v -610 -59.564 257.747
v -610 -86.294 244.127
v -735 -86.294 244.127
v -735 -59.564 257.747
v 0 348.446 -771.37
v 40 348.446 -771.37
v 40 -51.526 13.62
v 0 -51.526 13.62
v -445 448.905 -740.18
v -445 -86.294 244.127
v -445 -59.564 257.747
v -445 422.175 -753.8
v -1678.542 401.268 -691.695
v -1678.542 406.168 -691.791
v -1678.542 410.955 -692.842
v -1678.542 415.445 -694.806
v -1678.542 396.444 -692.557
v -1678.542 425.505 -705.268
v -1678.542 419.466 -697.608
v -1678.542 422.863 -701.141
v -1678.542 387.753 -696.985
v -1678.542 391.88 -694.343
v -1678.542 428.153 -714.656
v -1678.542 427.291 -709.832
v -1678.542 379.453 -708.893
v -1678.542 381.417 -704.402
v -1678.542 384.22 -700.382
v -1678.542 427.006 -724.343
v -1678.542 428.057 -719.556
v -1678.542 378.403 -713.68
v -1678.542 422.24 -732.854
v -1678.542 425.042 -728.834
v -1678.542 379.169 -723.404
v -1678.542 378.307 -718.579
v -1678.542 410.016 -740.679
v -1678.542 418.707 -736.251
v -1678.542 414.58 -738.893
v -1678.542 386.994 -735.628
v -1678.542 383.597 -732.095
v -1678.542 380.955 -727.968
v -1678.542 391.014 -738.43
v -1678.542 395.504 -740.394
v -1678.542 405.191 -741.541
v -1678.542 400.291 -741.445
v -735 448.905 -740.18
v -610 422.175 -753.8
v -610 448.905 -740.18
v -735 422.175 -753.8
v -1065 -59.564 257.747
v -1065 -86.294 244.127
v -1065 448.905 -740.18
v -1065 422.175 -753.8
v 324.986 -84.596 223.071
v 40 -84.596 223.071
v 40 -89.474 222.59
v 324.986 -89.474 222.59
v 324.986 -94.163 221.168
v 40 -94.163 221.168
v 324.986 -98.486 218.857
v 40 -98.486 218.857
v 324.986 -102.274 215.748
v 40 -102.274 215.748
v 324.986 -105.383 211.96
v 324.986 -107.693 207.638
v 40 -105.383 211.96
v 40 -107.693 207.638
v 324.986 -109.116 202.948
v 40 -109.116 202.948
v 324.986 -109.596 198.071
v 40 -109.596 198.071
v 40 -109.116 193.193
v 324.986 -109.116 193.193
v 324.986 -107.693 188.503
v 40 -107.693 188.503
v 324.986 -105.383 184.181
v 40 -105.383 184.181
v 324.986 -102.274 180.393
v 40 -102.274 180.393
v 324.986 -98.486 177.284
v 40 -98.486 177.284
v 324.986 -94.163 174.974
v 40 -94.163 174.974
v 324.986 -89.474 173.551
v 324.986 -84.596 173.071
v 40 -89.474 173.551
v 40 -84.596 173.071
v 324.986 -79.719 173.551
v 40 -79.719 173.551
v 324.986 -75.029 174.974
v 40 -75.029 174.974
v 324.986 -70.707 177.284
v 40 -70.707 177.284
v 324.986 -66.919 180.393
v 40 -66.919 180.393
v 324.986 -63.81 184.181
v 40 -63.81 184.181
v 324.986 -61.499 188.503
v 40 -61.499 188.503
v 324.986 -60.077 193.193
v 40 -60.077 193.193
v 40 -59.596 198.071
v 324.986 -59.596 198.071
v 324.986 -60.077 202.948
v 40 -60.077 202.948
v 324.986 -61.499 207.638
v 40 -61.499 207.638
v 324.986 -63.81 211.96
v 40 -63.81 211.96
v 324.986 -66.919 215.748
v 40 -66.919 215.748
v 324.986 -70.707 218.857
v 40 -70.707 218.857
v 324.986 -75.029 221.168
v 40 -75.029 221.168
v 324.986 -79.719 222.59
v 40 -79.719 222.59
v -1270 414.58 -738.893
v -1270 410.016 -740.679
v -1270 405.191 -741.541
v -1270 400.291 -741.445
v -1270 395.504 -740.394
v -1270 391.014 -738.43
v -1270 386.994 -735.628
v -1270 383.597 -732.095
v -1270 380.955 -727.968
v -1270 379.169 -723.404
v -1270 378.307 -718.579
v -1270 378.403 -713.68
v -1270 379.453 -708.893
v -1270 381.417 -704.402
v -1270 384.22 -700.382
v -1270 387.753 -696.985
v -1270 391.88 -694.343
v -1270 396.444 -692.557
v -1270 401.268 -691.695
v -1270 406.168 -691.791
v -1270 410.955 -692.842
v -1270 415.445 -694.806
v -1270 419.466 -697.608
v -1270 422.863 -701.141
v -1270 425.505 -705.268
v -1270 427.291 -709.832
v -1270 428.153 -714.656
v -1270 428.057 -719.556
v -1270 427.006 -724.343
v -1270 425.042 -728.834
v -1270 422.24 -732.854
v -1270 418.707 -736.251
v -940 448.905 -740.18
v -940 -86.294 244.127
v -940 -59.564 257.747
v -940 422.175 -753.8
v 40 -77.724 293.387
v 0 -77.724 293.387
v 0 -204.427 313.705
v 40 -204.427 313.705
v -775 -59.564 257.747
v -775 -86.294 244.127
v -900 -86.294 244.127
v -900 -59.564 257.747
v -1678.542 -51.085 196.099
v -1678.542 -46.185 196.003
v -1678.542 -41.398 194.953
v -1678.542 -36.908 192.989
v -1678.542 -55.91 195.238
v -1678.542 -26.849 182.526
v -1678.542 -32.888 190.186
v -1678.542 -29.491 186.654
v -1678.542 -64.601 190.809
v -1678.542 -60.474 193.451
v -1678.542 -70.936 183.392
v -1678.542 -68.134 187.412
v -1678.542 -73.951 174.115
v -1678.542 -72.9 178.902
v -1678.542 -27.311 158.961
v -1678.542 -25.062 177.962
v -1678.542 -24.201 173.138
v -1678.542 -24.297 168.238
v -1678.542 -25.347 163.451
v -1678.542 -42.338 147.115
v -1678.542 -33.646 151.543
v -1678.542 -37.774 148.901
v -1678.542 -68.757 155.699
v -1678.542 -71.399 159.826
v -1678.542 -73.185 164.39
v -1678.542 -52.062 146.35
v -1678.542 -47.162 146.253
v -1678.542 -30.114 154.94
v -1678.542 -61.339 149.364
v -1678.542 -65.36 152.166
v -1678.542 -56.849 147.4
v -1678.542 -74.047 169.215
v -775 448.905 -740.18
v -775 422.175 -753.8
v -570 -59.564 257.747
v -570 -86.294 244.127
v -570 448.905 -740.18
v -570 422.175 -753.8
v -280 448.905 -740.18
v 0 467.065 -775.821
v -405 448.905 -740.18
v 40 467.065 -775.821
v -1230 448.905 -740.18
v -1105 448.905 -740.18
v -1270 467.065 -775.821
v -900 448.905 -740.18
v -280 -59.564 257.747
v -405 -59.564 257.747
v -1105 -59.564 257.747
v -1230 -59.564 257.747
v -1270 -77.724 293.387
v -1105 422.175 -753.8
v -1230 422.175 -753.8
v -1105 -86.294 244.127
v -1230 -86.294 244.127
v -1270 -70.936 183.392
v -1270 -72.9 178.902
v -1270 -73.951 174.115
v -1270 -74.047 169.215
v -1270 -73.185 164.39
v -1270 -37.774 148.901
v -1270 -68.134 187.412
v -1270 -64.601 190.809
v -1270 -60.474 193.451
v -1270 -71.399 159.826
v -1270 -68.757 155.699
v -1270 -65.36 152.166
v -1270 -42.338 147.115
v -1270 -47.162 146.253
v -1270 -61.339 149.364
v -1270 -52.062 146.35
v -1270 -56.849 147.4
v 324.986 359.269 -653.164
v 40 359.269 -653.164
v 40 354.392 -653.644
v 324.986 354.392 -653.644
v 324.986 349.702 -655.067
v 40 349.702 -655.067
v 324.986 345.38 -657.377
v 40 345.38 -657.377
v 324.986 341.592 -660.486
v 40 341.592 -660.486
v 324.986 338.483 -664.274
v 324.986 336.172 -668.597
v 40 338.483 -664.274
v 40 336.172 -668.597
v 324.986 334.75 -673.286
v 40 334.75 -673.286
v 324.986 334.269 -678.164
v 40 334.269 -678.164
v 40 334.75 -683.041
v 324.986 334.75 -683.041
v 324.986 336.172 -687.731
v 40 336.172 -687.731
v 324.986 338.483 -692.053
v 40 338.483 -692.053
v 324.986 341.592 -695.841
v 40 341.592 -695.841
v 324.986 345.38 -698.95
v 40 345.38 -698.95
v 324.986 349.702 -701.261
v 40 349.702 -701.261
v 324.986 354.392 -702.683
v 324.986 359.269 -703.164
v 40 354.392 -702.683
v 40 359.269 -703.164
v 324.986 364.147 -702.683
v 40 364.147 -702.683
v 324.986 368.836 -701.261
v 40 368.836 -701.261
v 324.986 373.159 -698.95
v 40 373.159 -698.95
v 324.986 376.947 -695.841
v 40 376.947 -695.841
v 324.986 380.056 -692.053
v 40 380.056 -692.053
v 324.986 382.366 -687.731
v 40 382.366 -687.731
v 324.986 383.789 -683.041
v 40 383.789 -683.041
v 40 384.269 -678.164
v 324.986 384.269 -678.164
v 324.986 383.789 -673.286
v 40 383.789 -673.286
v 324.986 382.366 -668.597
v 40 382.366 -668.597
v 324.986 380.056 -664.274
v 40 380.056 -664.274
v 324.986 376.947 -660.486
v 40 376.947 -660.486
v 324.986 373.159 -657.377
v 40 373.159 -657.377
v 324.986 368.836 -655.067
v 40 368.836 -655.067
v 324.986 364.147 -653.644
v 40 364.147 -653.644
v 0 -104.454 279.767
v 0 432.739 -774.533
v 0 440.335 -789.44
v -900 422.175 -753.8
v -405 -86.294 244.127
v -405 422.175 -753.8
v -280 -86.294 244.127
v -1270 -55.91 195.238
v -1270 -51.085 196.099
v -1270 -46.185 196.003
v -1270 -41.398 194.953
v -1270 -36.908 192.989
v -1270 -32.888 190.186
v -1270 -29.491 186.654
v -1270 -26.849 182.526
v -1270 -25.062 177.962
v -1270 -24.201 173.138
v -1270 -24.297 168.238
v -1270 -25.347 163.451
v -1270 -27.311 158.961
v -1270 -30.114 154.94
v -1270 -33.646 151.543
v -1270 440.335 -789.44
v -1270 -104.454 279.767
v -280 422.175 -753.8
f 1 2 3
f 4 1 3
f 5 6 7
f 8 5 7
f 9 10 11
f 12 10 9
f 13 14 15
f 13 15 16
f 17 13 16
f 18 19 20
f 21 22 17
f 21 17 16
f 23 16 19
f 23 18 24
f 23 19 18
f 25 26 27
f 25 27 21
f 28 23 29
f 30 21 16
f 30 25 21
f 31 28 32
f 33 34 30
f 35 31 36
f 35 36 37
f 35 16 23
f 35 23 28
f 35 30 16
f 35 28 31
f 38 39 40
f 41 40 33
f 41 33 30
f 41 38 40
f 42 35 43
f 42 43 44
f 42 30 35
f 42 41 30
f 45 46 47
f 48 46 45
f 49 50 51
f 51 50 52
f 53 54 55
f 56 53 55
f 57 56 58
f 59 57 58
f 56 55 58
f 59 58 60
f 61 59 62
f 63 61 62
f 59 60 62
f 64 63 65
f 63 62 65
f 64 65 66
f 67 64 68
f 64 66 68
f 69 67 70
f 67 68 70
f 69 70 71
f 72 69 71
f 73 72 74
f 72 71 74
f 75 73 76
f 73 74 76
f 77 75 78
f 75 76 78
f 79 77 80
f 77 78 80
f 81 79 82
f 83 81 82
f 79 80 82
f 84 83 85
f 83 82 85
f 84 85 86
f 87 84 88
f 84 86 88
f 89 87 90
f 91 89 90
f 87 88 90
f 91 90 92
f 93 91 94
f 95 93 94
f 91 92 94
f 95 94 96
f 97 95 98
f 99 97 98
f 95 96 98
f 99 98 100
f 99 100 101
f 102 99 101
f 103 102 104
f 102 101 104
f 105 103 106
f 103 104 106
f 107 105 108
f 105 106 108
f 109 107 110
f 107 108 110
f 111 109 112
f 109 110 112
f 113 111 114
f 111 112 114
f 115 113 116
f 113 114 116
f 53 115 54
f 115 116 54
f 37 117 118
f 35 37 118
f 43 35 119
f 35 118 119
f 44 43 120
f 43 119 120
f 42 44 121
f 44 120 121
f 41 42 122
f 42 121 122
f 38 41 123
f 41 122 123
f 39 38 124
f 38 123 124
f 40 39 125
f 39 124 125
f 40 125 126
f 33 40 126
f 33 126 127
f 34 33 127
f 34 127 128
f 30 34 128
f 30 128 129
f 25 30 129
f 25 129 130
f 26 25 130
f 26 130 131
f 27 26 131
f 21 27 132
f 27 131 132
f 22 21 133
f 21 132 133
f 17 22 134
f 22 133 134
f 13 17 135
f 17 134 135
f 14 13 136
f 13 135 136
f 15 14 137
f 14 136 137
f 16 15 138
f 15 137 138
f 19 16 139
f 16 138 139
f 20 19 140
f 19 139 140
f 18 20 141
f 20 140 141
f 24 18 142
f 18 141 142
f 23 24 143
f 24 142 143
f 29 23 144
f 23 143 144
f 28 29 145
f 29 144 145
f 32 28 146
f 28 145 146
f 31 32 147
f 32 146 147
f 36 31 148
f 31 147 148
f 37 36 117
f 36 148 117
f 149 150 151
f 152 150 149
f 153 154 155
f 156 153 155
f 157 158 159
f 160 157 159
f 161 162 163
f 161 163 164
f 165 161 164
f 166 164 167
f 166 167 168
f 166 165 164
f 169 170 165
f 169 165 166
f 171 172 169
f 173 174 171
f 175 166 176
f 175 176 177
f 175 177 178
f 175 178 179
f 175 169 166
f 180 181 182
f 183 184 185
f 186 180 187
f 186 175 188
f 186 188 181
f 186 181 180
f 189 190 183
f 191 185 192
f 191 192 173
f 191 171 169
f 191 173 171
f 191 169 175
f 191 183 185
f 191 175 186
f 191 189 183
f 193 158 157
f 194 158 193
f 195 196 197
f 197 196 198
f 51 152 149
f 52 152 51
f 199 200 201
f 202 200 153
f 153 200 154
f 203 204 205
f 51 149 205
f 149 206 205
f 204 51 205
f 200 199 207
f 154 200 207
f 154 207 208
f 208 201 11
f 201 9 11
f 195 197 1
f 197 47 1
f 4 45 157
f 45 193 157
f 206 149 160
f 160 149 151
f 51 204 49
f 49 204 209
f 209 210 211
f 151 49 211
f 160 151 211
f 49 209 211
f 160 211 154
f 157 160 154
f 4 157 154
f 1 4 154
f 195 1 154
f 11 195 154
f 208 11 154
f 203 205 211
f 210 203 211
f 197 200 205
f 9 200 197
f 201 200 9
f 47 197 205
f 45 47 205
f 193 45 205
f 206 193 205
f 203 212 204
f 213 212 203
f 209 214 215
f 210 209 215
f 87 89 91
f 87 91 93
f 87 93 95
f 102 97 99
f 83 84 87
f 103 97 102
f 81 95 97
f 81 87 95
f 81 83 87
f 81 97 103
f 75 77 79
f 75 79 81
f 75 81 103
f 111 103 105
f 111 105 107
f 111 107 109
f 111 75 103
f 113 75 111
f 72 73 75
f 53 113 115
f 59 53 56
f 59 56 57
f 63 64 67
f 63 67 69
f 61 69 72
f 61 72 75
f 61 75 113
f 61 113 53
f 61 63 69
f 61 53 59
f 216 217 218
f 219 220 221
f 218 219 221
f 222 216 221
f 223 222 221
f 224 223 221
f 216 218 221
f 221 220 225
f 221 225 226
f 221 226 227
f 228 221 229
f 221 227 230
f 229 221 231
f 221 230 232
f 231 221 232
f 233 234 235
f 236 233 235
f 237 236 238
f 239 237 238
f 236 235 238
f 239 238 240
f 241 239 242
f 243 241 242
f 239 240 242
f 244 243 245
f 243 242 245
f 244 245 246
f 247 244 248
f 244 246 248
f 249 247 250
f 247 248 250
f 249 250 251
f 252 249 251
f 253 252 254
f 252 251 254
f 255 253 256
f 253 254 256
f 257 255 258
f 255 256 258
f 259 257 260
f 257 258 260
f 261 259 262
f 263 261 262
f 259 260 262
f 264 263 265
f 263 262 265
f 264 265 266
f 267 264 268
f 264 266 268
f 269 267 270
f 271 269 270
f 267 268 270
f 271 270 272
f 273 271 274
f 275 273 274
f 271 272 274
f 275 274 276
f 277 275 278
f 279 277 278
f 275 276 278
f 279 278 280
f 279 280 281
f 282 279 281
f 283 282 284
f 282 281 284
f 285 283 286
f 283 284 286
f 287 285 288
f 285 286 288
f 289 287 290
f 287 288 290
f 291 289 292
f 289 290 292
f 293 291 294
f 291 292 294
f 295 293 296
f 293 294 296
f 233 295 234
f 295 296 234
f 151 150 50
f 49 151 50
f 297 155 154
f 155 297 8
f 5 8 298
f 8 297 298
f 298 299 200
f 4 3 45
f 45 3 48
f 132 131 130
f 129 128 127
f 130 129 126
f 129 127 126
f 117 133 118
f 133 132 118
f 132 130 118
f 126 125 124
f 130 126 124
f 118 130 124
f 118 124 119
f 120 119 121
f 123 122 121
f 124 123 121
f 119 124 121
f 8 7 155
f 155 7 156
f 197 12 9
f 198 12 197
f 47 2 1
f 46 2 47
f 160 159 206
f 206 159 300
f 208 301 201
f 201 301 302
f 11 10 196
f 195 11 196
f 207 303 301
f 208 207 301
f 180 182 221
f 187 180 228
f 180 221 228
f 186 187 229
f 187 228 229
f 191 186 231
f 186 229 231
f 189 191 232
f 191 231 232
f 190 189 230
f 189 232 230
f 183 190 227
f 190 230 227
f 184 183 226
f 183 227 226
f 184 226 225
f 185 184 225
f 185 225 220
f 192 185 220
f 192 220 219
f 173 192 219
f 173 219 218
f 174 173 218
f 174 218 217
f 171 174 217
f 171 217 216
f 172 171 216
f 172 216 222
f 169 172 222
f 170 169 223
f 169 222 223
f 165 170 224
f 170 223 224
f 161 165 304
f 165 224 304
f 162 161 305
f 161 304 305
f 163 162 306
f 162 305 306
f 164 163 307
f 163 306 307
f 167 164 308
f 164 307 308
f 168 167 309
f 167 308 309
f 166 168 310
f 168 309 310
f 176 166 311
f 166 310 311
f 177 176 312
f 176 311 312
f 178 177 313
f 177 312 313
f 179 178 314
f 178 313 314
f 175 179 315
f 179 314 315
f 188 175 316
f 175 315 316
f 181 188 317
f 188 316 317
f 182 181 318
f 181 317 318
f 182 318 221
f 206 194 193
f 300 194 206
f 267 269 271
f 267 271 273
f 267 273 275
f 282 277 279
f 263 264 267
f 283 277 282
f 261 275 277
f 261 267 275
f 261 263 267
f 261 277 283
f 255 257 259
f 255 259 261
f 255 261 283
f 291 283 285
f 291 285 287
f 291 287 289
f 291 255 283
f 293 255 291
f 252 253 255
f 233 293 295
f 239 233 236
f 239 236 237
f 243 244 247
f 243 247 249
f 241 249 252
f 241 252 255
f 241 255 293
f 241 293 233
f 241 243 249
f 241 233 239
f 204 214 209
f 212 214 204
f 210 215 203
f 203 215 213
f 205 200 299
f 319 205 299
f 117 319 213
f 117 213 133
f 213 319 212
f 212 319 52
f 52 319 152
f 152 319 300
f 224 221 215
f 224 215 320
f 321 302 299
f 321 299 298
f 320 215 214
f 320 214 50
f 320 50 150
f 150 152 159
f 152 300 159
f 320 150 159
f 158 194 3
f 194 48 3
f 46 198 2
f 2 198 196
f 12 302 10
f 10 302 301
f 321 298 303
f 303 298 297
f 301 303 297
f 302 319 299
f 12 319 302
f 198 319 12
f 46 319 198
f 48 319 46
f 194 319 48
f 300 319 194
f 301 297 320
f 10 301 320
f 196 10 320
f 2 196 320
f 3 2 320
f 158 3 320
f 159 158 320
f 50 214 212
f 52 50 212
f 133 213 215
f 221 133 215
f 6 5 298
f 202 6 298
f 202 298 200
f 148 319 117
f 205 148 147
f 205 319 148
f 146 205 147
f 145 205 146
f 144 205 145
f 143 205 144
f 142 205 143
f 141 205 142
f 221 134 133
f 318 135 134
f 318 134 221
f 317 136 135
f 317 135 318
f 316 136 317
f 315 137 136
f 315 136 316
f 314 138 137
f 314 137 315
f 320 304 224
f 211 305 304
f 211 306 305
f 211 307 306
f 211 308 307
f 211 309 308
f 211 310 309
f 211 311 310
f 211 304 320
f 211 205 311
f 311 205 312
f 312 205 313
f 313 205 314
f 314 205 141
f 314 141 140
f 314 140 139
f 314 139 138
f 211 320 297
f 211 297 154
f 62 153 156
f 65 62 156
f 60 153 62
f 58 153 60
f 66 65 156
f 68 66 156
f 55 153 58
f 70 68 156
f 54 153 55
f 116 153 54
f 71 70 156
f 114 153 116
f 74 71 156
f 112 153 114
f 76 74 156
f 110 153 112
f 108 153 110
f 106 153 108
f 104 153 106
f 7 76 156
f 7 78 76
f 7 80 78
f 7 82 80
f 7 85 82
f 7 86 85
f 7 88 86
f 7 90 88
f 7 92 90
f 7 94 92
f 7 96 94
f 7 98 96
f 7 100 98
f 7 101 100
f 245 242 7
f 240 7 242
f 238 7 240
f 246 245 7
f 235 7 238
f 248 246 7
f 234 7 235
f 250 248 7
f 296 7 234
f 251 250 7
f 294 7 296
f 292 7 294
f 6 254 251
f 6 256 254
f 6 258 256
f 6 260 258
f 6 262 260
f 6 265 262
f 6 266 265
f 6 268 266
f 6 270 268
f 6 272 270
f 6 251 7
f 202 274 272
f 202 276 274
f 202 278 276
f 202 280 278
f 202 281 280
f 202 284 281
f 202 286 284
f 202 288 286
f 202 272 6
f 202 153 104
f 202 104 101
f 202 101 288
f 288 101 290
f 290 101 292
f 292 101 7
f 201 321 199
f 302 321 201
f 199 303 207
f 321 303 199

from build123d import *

# Parameters (mm, degrees)
SKETCH1_W               = 1200
SKETCH1_H               = 1500
BOSS_EXTRUDE1_DEPTH     = 160
BOSS_EXTRUDE2_DEPTH     = 1270
SKETCH3_W               = 125
SKETCH3_H               = 1120
CUT_EXTRUDE2_DEPTH      = 30
LPATTERN1_COUNT         = 6
LPATTERN1_PITCH         = 165
SKETCH4_W               = 125
SKETCH4_H               = 1120
CUT_EXTRUDE3_DEPTH      = 30
LPATTERN2_COUNT         = 6
LPATTERN2_PITCH         = 165
CUT_EXTRUDE5_DEPTH      = 70
CUT_EXTRUDE5_DEPTH_BACK = 3200
SKETCH5_W               = 160
SKETCH5_H               = 1200
BOSS_EXTRUDE3_DEPTH     = 40
CUT_EXTRUDE6_DEPTH      = 1622
SKETCH8_R               = 25
BOSS_EXTRUDE4_DEPTH     = 284.986135381
SKETCH10_R              = 25
BOSS_EXTRUDE5_DEPTH     = 408.541682101


with BuildPart() as part:
    # Sketch1 → Boss-Extrude1 (new body)
    with BuildSketch(Plane(origin=(0, 0, 0), x_dir=(0, 0, -1), z_dir=(1, 0, 0))):
        with Locations((564.361948956, -723.13225058)):
            Rectangle(SKETCH1_W, SKETCH1_H)
    extrude(amount=BOSS_EXTRUDE1_DEPTH)

    # Sketch2 → Boss-Extrude2 (add)
    with BuildSketch(Plane.ZY):
        Polygon((293.387128793, -77.723630642), (-775.820700233, 467.064969046), (-789.440415225, 440.33477332), (279.767413801, -104.453826367), align=None)
        Polygon((333.138052406, -383.823490794), (-736.06977662, -928.612090481), (-722.450061628, -955.342286207), (346.757767398, -410.553686519), align=None)
    extrude(amount=BOSS_EXTRUDE2_DEPTH)

    # Sketch3 → Cut-Extrude2 (cut)
    with BuildSketch(Plane(origin=(0, -466.202007743, 237.541787551), x_dir=(-1, 0, 0), z_dir=(0, -0.8910065241883673, 0.45399049973954775))):
        with Locations((1167.066310977, 477.424040248)):
            Rectangle(SKETCH3_W, SKETCH3_H)
    cut_extrude2 = extrude(amount=-CUT_EXTRUDE2_DEPTH, mode=Mode.SUBTRACT)

    # LPattern1: Cut-Extrude2 ×6
    with Locations(*[(i * LPATTERN1_PITCH, 0, 0) for i in range(1, LPATTERN1_COUNT)]):
        add(cut_extrude2, mode=Mode.SUBTRACT)

    # Sketch4 → Cut-Extrude3 (cut)
    with BuildSketch(Plane(origin=(0, 30.243173593, 15.409666619), x_dir=(-1, 0, 0), z_dir=(0, -0.891006524188367, -0.4539904997395487))):
        with Locations((1167.5, 303.304364216)):
            Rectangle(SKETCH4_W, SKETCH4_H)
    cut_extrude3 = extrude(amount=-CUT_EXTRUDE3_DEPTH, mode=Mode.SUBTRACT)

    # LPattern2: Cut-Extrude3 ×6
    with Locations(*[(i * LPATTERN2_PITCH, 0, 0) for i in range(1, LPATTERN2_COUNT)]):
        add(cut_extrude3, mode=Mode.SUBTRACT)

    # Sketch5 → Cut-Extrude5 (cut, two sides: drawn at the far end of the back side and taken through both)
    with BuildSketch(Plane(origin=(0, 26.86774942, 0), x_dir=(1, 0, 0), z_dir=(0, 1, 0)).offset(-CUT_EXTRUDE5_DEPTH_BACK)):
        with Locations((80, 564.361948956)):
            Rectangle(SKETCH5_W, SKETCH5_H)
    extrude(amount=CUT_EXTRUDE5_DEPTH + CUT_EXTRUDE5_DEPTH_BACK, mode=Mode.SUBTRACT)


with BuildPart() as cut_extrude5_piece_1:
    # of the separate pieces the step leaves, piece 1, a body of its own (cut_extrude5_pieces)
    add(part.part.solids().sort_by_distance((0, -104.453826367, 279.767413801))[0])



with BuildPart() as cut_extrude5_piece_2:
    # of the separate pieces the step leaves, piece 2, a body of its own (cut_extrude5_pieces)
    add(part.part.solids().sort_by_distance((0, -410.553686519, 346.757767398))[0])


with BuildPart() as cut_extrude5_piece_1_1:
    add(cut_extrude5_piece_1.part)

    add(cut_extrude5_piece_2.part)  # Boss-Extrude3 merges Cut-Extrude5 piece 2
    # Sketch6 → Boss-Extrude3 (add)
    with BuildSketch(Plane(origin=(0, 0, 0), x_dir=(0, 0, -1), z_dir=(1, 0, 0))):
        Polygon((-293.387128793, -77.723630642), (-346.757767398, -410.553686519), (722.450061628, -955.342286207), (775.820700233, 467.064969046), align=None)
    extrude(amount=BOSS_EXTRUDE3_DEPTH)

    # Sketch7 → Cut-Extrude6 (cut)
    with BuildSketch(Plane(origin=(40, 0, 0), x_dir=(0, 0, -1), z_dir=(1, 0, 0))):
        Polygon((779.00615654, 352.336895643), (771.36995873, 348.446058521), (722.450061628, -955.342286207), (-346.757767398, -410.553686519), (-313.704524727, -204.427005397), (-484.232359842, -291.315277235), (-228.557425004, -1565.861378417), (1566.457503136, -862.127788671), align=None)
        Polygon((771.36995873, 348.446058521), (-13.619714992, -51.52615783), (-313.704524727, -204.427005397), (-346.757767398, -410.553686519), (722.450061628, -955.342286207), align=None)
    extrude(amount=-CUT_EXTRUDE6_DEPTH, mode=Mode.SUBTRACT)

    # Sketch8 → Boss-Extrude4 (add)
    with BuildSketch(Plane(origin=(40, 0, 0), x_dir=(0, 0, -1), z_dir=(1, 0, 0))):
        with Locations(Location((-198.070529097, -84.596305771, 0), (0, 0, 180))):
            Circle(SKETCH8_R)
        with Locations(Location((678.163657159, 359.269351402, 0), (0, 0, 180))):
            Circle(SKETCH8_R)
    extrude(amount=BOSS_EXTRUDE4_DEPTH)

    # Sketch10 → Boss-Extrude5 (add)
    with BuildSketch(Plane.ZY.offset(1270)):
        with Locations(Location((-716.617969304, 403.229883829, 0), (0, 0, 153))):
            Circle(SKETCH10_R)
        with Locations(Location((171.176211965, -49.123845441, 0), (0, 0, 153))):
            Circle(SKETCH10_R)
    extrude(amount=BOSS_EXTRUDE5_DEPTH)


solid = cut_extrude5_piece_1_1.part
